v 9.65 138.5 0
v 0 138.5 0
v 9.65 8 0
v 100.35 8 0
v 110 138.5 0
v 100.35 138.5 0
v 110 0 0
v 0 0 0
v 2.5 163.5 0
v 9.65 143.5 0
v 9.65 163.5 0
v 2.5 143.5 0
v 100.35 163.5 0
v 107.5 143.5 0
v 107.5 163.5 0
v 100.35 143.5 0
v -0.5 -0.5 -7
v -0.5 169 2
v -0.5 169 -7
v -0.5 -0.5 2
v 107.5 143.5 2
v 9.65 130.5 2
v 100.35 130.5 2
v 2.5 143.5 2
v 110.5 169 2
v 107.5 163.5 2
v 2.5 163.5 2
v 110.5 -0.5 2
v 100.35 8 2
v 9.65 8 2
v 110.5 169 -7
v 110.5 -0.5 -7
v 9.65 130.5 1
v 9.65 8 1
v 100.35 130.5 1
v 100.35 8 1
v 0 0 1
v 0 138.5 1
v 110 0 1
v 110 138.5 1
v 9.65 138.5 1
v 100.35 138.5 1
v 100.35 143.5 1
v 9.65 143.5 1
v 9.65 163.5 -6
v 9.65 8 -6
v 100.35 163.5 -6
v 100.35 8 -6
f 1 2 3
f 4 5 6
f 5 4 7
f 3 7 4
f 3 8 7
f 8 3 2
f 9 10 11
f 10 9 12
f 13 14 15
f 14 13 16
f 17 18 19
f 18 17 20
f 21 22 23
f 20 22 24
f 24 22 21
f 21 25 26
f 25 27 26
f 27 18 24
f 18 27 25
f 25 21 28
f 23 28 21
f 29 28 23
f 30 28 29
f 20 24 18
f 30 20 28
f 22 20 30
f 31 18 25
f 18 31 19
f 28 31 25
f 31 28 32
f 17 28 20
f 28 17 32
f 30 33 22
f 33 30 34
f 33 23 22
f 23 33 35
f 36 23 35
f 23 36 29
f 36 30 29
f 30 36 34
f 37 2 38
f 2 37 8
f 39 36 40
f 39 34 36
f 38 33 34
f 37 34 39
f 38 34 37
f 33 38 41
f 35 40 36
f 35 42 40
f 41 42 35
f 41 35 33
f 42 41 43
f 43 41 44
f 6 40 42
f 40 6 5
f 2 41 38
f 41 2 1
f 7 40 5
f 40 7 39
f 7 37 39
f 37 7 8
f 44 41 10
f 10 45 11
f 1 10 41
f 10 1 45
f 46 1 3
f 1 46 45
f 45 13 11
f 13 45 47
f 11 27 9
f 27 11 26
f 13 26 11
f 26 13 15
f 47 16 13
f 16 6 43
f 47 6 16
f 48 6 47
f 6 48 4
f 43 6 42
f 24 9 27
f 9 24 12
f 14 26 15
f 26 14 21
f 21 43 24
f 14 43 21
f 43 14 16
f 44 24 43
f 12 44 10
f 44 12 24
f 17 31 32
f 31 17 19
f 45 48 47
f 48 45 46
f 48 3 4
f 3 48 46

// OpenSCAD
$fn = 20;

union() {
	color(alpha = 1.0, c = [0.46810256823426105, 0.6699492535792404, 0.1928958739904499]) {
		difference() {
			linear_extrude(height = 2) {
				translate(v = [0, 15.0, 0]) {
					translate(v = [-0.5, -15.5, 0.0]) {
						color(alpha = 1.0, c = [0.20125317221201128, 0.6907920815379025, 0.47966761189275336]) {
							square(center = false, size = [111, 169.5]);
						}
					}
				}
			}
			translate(v = [0, 0, -5]) {
				color(alpha = 1.0, c = [0.21044753832183283, 0.6773105080456748, 0.6433941168468681]) {
					linear_extrude(height = 30) {
						translate(v = [9.649999999999999, 8.0, 0.0]) {
							color(alpha = 1.0, c = [0.8616090647292522, 0.536495730113334, 0.19548899031476086]) {
								square(center = false, size = [90.7, 122.5]);
							}
						}
					}
				}
			}
			color(alpha = 1.0, c = [0.8616090647292522, 0.536495730113334, 0.19548899031476086]) {
				linear_extrude(height = 1) {
					translate(v = [0, 0, 2]) {
						color(alpha = 1.0, c = [0.9677975592919913, 0.44127456009157356, 0.5358103155058701]) {
							square(center = false, size = [110, 138.5]);
						}
					}
				}
			}
			color(alpha = 1.0, c = [0.20125317221201128, 0.6907920815379025, 0.47966761189275336]) {
				translate(v = [0, 0, -6]) {
					linear_extrude(height = 7) {
						translate(v = [0, 76.75, 0]) {
							translate(v = [0, 0, 10]) {
								translate(v = [9.649999999999999, 51.75, 0.0]) {
									color(alpha = 1.0, c = [0.6804189127793346, 0.6151497514677574, 0.19405452111445337]) {
										square(center = false, size = [90.7, 35]);
									}
								}
							}
						}
					}
				}
			}
			translate(v = [0, 0, -4]) {
				linear_extrude(height = 6) {
					translate(v = [0, 84.25, 0]) {
						translate(v = [2.5, 59.25, 0.0]) {
							color(alpha = 1.0, c = [0.962272393509669, 0.3976451968965351, 0.8008274363432775]) {
								square(center = false, size = [105, 20]);
							}
						}
					}
				}
			}
		}
	}
	difference() {
		color(alpha = 1.0, c = [0.962272393509669, 0.3976451968965351, 0.8008274363432775]) {
			translate(v = [0, 0, -7]) {
				linear_extrude(height = 7) {
					translate(v = [0, 15.0, 0]) {
						translate(v = [-0.5, -15.5, 0.0]) {
							color(alpha = 1.0, c = [0.20125317221201128, 0.6907920815379025, 0.47966761189275336]) {
								square(center = false, size = [111, 169.5]);
							}
						}
					}
				}
			}
		}
		translate(v = [0, 0, -6]) {
			color(alpha = 1.0, c = [0.21044753832183283, 0.6773105080456748, 0.6433941168468681]) {
				linear_extrude(height = 30) {
					translate(v = [9.649999999999999, 8.0, 0.0]) {
						color(alpha = 1.0, c = [0.8616090647292522, 0.536495730113334, 0.19548899031476086]) {
							square(center = false, size = [90.7, 122.5]);
						}
					}
				}
			}
		}
		color(alpha = 1.0, c = [0.20125317221201128, 0.6907920815379025, 0.47966761189275336]) {
			translate(v = [0, 0, -6]) {
				linear_extrude(height = 7) {
					translate(v = [0, 76.75, 0]) {
						translate(v = [0, 0, 10]) {
							translate(v = [9.649999999999999, 51.75, 0.0]) {
								color(alpha = 1.0, c = [0.6804189127793346, 0.6151497514677574, 0.19405452111445337]) {
									square(center = false, size = [90.7, 35]);
								}
							}
						}
					}
				}
			}
		}
	}
}
